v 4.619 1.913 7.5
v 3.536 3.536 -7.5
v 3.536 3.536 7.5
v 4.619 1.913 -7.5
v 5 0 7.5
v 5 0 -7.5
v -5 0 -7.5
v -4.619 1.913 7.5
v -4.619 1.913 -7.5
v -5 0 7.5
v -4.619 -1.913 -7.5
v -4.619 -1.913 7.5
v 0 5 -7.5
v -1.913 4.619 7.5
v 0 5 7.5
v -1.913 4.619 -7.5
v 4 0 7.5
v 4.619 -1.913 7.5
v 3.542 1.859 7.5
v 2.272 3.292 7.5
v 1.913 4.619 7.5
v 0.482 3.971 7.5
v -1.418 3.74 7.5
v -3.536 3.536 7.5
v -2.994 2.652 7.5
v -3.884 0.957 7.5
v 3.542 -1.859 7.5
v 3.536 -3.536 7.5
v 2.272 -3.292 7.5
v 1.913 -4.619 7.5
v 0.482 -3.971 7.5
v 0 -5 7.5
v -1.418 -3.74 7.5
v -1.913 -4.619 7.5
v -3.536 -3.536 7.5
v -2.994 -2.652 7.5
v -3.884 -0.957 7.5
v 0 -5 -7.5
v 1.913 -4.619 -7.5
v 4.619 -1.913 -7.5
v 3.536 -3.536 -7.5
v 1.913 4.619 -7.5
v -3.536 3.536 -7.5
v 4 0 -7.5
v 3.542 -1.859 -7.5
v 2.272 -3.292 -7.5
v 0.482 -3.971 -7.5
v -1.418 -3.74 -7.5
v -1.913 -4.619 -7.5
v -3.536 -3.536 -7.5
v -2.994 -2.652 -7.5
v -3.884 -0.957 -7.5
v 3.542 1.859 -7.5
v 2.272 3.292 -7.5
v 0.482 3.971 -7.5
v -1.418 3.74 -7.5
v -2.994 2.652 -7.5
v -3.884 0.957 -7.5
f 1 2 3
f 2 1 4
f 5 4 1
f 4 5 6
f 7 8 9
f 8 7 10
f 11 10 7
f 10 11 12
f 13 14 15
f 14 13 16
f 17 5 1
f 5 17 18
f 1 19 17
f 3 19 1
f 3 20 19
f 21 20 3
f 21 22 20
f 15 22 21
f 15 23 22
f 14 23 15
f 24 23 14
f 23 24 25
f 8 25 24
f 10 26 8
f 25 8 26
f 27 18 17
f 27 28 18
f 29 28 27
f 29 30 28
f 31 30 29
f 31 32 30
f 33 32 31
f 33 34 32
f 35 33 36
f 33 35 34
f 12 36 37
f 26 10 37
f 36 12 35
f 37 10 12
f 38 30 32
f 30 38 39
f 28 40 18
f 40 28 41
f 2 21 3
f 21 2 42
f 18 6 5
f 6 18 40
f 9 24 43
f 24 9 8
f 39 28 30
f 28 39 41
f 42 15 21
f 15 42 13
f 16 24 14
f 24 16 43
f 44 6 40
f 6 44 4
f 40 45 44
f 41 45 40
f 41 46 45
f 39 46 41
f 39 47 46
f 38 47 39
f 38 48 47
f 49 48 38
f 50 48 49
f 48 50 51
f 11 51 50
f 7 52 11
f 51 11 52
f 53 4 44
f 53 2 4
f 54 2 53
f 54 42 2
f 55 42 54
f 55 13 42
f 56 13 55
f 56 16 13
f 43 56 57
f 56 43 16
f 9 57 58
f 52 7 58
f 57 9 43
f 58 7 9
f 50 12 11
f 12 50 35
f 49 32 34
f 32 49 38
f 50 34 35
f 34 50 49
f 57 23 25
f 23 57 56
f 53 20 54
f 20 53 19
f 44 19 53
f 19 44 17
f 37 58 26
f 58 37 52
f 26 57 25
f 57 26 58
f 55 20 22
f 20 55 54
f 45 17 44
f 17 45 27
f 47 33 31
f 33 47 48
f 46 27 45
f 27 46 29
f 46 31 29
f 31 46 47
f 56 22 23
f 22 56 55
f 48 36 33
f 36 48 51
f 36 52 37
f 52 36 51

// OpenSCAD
// Parameters
length_mm = 15; //[8:30:1]
outer_diameter_mm = 10; //[5:20:0.5]
inner_diameter_mm = 8; //[4:18:0.5]
center = 1; //[0:1:1]
eps_overlap_mm = 0.8; //[0.5:2:0.1]

// Tubing - complete geometry
module tubing() {
  color([0.85, 0.85, 0.8]) { // Off-white for PVC
    difference() {
      // Outer cylinder
      translate([0, 0, center * (0) + (1 - center) * (length_mm / 2)])
        cylinder(r=outer_diameter_mm / 2, h=length_mm, center=true);
      // Inner cut cylinder
      translate([0, 0, center * (0) + (1 - center) * (length_mm / 2)])
        cylinder(r=inner_diameter_mm / 2, h=length_mm + 2 * eps_overlap_mm, center=true);
    }
  }
}

// Assembly
module assembly() {
  tubing();
}

assembly();
